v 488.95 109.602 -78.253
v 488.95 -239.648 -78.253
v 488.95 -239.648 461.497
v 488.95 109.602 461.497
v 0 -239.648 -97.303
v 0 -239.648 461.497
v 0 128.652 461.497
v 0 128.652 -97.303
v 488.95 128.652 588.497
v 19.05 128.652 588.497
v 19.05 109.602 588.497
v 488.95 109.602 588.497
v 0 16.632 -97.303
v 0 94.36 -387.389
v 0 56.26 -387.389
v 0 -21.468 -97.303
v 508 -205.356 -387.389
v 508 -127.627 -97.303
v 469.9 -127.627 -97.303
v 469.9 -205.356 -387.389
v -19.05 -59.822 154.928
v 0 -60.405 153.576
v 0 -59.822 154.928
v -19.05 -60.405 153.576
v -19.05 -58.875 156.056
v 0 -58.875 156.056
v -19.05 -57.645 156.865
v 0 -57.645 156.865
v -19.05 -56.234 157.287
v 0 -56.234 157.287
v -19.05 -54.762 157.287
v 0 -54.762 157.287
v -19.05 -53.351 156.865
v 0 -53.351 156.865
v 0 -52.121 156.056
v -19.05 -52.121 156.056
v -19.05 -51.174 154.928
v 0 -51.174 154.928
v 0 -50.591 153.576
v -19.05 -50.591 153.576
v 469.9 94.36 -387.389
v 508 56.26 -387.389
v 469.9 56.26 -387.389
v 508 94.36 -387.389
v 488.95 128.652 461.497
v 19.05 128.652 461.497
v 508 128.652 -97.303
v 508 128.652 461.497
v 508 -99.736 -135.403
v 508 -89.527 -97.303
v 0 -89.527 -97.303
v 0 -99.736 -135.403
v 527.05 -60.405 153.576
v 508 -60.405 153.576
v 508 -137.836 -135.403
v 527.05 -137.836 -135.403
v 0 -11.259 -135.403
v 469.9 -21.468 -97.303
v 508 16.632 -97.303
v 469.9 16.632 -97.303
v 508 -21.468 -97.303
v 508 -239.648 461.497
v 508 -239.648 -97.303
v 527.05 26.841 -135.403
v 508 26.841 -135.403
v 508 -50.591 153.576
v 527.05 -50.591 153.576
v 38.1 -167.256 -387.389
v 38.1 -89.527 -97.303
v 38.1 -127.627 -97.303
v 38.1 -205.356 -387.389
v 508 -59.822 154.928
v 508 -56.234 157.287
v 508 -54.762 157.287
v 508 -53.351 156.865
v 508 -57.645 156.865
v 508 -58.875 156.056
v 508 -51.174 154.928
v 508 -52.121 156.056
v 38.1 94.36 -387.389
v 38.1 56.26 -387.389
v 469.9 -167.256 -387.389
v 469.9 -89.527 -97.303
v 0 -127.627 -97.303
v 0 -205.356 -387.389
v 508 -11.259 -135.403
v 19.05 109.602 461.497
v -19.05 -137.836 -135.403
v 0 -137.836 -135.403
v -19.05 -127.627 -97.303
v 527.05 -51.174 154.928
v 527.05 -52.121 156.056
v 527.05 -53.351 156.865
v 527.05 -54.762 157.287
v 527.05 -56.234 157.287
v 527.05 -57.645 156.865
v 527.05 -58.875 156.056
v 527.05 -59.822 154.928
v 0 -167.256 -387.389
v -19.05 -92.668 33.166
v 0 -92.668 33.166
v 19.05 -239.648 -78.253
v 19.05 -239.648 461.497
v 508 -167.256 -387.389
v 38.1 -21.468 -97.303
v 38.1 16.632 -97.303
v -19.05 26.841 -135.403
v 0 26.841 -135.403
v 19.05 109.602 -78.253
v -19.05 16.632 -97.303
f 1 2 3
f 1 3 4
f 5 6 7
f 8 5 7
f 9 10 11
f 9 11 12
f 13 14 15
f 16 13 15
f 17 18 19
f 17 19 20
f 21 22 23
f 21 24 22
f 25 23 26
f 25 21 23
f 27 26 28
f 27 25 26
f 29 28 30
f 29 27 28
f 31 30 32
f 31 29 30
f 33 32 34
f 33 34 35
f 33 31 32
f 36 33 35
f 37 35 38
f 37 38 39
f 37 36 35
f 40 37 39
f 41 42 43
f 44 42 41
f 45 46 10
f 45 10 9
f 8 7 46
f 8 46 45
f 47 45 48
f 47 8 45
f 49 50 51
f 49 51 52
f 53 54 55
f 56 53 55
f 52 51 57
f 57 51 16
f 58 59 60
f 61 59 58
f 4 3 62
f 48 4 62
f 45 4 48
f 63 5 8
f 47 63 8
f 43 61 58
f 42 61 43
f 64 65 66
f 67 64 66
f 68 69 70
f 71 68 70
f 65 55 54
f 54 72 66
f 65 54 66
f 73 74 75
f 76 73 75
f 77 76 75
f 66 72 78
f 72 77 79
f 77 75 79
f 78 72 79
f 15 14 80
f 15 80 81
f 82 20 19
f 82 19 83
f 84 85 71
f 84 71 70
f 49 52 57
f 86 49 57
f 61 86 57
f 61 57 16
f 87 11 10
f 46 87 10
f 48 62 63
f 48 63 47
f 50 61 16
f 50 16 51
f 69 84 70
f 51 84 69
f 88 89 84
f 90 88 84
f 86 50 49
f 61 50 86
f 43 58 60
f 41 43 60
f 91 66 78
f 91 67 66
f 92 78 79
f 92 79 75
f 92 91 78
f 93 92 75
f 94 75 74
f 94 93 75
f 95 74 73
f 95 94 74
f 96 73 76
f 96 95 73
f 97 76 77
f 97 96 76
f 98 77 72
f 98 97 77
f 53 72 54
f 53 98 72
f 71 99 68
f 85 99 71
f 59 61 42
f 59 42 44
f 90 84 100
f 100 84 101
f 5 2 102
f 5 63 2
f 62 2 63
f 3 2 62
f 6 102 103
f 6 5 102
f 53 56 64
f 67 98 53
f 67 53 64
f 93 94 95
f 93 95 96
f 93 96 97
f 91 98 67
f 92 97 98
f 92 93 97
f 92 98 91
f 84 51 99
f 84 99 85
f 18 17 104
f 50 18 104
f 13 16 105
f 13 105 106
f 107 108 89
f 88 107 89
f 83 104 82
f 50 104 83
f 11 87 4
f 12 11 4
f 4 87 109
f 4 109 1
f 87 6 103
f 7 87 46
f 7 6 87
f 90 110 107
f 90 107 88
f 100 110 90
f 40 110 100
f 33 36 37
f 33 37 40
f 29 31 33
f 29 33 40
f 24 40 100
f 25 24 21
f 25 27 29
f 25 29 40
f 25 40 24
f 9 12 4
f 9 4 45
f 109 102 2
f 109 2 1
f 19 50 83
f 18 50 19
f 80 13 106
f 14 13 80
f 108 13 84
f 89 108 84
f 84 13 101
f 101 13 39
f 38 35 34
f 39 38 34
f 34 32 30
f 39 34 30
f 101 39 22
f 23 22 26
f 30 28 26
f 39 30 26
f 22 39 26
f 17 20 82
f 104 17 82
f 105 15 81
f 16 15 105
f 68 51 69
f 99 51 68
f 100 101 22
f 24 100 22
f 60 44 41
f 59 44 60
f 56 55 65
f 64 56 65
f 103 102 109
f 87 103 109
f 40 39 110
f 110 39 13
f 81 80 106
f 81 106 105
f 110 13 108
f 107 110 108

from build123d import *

# Parameters (mm, degrees)
F0_W      = 368.3
F0_H      = 558.8
F1_DEPTH  = 508
F2_T      = -19.05
F3_W      = 469.9
F3_H      = 19.05
F4_DEPTH  = 127
F6_DEPTH  = 38.1
F8_DEPTH  = 38.1
F10_DEPTH = 508
F12_DEPTH = 19.05
F14_DEPTH = 19.05
F15_R     = 5.08
F16_R     = 5.08


with BuildPart() as f1:
    # F0 (on Right) → F1 (new body)
    with BuildSketch(Plane.YZ):
        with Locations((-55.497904, 182.097384)):
            Rectangle(F0_W, F0_H)
    extrude(amount=F1_DEPTH)

    # F2
    f2_openings = [f1.faces().sort_by_distance(p)[0] for p in [
        (254, -55.497904, 461.497384),
        (254, -239.647904, 182.097384),
    ]]
    offset(amount=F2_T, openings=f2_openings)

    # F3 (on face) → F4 (join)
    with BuildSketch(Plane.XY.offset(461.497384)):
        with Locations((254, 119.127096)):
            Rectangle(F3_W, F3_H)
    extrude(amount=F4_DEPTH)


with BuildPart() as f6:
    # F5 (on face) → F6 (new body)
    with BuildSketch(Plane.YZ.offset(508)):
        Polygon((16.631643, -97.302616), (-21.468357, -97.302616), (56.260159, -387.389387), (94.360159, -387.389387), align=None)
        Polygon((-127.627452, -97.302616), (-205.355968, -387.389387), (-167.255968, -387.389387), (-89.527452, -97.302616), align=None)
    extrude(amount=-F6_DEPTH)


with BuildPart() as f8:
    # F7 (on face) → F8 (new body)
    with BuildSketch(Plane(origin=(0, 0, 0), x_dir=(0, -1, 0), z_dir=(-1, 0, 0))):
        Polygon((-16.631643, -97.302616), (-94.360159, -387.389387), (-56.260159, -387.389387), (21.468357, -97.302616), align=None)
        Polygon((127.627452, -97.302616), (89.527452, -97.302616), (167.255968, -387.389387), (205.355968, -387.389387), align=None)
    extrude(amount=-F8_DEPTH)


with BuildPart() as f10:
    # F9 (on face) → F10 (new body, through all)
    with BuildSketch(Plane.YZ.offset(508)):
        Polygon((-21.468357, -97.302616), (-89.527452, -97.302616), (-99.736316, -135.402616), (-11.259493, -135.402616), align=None)
    extrude(amount=-F10_DEPTH)


with BuildPart() as f12:
    # F11 (on face) → F12 (new body)
    with BuildSketch(Plane(origin=(0, 0, 0), x_dir=(0, -1, 0), z_dir=(-1, 0, 0))):
        Polygon((-26.840507, -135.402616), (11.259493, -135.402616), (99.736316, -135.402616), (137.836316, -135.402616), (127.627452, -97.302616), (92.668365, 33.166474), (55.497904, 171.88852), (-16.631643, -97.302616), align=None)
    extrude(amount=F12_DEPTH)

    # F16
    f16_edges = [f12.edges().sort_by_distance(p)[0] for p in [
        (-9.525, -55.497904, 171.88852),
    ]]
    fillet(f16_edges, radius=F16_R)


with BuildPart() as f14:
    # F13 (on face) → F14 (new body)
    with BuildSketch(Plane.YZ.offset(508)):
        Polygon((26.840507, -135.402616), (-55.497904, 171.88852), (-137.836316, -135.402616), (-99.736316, -135.402616), (-11.259493, -135.402616), align=None)
    extrude(amount=F14_DEPTH)

    # F15
    f15_edges = [f14.edges().sort_by_distance(p)[0] for p in [
        (517.525, -55.497904, 171.88852),
    ]]
    fillet(f15_edges, radius=F15_R)


solid = Compound([f1.part, f6.part, f8.part, f10.part, f12.part, f14.part])
